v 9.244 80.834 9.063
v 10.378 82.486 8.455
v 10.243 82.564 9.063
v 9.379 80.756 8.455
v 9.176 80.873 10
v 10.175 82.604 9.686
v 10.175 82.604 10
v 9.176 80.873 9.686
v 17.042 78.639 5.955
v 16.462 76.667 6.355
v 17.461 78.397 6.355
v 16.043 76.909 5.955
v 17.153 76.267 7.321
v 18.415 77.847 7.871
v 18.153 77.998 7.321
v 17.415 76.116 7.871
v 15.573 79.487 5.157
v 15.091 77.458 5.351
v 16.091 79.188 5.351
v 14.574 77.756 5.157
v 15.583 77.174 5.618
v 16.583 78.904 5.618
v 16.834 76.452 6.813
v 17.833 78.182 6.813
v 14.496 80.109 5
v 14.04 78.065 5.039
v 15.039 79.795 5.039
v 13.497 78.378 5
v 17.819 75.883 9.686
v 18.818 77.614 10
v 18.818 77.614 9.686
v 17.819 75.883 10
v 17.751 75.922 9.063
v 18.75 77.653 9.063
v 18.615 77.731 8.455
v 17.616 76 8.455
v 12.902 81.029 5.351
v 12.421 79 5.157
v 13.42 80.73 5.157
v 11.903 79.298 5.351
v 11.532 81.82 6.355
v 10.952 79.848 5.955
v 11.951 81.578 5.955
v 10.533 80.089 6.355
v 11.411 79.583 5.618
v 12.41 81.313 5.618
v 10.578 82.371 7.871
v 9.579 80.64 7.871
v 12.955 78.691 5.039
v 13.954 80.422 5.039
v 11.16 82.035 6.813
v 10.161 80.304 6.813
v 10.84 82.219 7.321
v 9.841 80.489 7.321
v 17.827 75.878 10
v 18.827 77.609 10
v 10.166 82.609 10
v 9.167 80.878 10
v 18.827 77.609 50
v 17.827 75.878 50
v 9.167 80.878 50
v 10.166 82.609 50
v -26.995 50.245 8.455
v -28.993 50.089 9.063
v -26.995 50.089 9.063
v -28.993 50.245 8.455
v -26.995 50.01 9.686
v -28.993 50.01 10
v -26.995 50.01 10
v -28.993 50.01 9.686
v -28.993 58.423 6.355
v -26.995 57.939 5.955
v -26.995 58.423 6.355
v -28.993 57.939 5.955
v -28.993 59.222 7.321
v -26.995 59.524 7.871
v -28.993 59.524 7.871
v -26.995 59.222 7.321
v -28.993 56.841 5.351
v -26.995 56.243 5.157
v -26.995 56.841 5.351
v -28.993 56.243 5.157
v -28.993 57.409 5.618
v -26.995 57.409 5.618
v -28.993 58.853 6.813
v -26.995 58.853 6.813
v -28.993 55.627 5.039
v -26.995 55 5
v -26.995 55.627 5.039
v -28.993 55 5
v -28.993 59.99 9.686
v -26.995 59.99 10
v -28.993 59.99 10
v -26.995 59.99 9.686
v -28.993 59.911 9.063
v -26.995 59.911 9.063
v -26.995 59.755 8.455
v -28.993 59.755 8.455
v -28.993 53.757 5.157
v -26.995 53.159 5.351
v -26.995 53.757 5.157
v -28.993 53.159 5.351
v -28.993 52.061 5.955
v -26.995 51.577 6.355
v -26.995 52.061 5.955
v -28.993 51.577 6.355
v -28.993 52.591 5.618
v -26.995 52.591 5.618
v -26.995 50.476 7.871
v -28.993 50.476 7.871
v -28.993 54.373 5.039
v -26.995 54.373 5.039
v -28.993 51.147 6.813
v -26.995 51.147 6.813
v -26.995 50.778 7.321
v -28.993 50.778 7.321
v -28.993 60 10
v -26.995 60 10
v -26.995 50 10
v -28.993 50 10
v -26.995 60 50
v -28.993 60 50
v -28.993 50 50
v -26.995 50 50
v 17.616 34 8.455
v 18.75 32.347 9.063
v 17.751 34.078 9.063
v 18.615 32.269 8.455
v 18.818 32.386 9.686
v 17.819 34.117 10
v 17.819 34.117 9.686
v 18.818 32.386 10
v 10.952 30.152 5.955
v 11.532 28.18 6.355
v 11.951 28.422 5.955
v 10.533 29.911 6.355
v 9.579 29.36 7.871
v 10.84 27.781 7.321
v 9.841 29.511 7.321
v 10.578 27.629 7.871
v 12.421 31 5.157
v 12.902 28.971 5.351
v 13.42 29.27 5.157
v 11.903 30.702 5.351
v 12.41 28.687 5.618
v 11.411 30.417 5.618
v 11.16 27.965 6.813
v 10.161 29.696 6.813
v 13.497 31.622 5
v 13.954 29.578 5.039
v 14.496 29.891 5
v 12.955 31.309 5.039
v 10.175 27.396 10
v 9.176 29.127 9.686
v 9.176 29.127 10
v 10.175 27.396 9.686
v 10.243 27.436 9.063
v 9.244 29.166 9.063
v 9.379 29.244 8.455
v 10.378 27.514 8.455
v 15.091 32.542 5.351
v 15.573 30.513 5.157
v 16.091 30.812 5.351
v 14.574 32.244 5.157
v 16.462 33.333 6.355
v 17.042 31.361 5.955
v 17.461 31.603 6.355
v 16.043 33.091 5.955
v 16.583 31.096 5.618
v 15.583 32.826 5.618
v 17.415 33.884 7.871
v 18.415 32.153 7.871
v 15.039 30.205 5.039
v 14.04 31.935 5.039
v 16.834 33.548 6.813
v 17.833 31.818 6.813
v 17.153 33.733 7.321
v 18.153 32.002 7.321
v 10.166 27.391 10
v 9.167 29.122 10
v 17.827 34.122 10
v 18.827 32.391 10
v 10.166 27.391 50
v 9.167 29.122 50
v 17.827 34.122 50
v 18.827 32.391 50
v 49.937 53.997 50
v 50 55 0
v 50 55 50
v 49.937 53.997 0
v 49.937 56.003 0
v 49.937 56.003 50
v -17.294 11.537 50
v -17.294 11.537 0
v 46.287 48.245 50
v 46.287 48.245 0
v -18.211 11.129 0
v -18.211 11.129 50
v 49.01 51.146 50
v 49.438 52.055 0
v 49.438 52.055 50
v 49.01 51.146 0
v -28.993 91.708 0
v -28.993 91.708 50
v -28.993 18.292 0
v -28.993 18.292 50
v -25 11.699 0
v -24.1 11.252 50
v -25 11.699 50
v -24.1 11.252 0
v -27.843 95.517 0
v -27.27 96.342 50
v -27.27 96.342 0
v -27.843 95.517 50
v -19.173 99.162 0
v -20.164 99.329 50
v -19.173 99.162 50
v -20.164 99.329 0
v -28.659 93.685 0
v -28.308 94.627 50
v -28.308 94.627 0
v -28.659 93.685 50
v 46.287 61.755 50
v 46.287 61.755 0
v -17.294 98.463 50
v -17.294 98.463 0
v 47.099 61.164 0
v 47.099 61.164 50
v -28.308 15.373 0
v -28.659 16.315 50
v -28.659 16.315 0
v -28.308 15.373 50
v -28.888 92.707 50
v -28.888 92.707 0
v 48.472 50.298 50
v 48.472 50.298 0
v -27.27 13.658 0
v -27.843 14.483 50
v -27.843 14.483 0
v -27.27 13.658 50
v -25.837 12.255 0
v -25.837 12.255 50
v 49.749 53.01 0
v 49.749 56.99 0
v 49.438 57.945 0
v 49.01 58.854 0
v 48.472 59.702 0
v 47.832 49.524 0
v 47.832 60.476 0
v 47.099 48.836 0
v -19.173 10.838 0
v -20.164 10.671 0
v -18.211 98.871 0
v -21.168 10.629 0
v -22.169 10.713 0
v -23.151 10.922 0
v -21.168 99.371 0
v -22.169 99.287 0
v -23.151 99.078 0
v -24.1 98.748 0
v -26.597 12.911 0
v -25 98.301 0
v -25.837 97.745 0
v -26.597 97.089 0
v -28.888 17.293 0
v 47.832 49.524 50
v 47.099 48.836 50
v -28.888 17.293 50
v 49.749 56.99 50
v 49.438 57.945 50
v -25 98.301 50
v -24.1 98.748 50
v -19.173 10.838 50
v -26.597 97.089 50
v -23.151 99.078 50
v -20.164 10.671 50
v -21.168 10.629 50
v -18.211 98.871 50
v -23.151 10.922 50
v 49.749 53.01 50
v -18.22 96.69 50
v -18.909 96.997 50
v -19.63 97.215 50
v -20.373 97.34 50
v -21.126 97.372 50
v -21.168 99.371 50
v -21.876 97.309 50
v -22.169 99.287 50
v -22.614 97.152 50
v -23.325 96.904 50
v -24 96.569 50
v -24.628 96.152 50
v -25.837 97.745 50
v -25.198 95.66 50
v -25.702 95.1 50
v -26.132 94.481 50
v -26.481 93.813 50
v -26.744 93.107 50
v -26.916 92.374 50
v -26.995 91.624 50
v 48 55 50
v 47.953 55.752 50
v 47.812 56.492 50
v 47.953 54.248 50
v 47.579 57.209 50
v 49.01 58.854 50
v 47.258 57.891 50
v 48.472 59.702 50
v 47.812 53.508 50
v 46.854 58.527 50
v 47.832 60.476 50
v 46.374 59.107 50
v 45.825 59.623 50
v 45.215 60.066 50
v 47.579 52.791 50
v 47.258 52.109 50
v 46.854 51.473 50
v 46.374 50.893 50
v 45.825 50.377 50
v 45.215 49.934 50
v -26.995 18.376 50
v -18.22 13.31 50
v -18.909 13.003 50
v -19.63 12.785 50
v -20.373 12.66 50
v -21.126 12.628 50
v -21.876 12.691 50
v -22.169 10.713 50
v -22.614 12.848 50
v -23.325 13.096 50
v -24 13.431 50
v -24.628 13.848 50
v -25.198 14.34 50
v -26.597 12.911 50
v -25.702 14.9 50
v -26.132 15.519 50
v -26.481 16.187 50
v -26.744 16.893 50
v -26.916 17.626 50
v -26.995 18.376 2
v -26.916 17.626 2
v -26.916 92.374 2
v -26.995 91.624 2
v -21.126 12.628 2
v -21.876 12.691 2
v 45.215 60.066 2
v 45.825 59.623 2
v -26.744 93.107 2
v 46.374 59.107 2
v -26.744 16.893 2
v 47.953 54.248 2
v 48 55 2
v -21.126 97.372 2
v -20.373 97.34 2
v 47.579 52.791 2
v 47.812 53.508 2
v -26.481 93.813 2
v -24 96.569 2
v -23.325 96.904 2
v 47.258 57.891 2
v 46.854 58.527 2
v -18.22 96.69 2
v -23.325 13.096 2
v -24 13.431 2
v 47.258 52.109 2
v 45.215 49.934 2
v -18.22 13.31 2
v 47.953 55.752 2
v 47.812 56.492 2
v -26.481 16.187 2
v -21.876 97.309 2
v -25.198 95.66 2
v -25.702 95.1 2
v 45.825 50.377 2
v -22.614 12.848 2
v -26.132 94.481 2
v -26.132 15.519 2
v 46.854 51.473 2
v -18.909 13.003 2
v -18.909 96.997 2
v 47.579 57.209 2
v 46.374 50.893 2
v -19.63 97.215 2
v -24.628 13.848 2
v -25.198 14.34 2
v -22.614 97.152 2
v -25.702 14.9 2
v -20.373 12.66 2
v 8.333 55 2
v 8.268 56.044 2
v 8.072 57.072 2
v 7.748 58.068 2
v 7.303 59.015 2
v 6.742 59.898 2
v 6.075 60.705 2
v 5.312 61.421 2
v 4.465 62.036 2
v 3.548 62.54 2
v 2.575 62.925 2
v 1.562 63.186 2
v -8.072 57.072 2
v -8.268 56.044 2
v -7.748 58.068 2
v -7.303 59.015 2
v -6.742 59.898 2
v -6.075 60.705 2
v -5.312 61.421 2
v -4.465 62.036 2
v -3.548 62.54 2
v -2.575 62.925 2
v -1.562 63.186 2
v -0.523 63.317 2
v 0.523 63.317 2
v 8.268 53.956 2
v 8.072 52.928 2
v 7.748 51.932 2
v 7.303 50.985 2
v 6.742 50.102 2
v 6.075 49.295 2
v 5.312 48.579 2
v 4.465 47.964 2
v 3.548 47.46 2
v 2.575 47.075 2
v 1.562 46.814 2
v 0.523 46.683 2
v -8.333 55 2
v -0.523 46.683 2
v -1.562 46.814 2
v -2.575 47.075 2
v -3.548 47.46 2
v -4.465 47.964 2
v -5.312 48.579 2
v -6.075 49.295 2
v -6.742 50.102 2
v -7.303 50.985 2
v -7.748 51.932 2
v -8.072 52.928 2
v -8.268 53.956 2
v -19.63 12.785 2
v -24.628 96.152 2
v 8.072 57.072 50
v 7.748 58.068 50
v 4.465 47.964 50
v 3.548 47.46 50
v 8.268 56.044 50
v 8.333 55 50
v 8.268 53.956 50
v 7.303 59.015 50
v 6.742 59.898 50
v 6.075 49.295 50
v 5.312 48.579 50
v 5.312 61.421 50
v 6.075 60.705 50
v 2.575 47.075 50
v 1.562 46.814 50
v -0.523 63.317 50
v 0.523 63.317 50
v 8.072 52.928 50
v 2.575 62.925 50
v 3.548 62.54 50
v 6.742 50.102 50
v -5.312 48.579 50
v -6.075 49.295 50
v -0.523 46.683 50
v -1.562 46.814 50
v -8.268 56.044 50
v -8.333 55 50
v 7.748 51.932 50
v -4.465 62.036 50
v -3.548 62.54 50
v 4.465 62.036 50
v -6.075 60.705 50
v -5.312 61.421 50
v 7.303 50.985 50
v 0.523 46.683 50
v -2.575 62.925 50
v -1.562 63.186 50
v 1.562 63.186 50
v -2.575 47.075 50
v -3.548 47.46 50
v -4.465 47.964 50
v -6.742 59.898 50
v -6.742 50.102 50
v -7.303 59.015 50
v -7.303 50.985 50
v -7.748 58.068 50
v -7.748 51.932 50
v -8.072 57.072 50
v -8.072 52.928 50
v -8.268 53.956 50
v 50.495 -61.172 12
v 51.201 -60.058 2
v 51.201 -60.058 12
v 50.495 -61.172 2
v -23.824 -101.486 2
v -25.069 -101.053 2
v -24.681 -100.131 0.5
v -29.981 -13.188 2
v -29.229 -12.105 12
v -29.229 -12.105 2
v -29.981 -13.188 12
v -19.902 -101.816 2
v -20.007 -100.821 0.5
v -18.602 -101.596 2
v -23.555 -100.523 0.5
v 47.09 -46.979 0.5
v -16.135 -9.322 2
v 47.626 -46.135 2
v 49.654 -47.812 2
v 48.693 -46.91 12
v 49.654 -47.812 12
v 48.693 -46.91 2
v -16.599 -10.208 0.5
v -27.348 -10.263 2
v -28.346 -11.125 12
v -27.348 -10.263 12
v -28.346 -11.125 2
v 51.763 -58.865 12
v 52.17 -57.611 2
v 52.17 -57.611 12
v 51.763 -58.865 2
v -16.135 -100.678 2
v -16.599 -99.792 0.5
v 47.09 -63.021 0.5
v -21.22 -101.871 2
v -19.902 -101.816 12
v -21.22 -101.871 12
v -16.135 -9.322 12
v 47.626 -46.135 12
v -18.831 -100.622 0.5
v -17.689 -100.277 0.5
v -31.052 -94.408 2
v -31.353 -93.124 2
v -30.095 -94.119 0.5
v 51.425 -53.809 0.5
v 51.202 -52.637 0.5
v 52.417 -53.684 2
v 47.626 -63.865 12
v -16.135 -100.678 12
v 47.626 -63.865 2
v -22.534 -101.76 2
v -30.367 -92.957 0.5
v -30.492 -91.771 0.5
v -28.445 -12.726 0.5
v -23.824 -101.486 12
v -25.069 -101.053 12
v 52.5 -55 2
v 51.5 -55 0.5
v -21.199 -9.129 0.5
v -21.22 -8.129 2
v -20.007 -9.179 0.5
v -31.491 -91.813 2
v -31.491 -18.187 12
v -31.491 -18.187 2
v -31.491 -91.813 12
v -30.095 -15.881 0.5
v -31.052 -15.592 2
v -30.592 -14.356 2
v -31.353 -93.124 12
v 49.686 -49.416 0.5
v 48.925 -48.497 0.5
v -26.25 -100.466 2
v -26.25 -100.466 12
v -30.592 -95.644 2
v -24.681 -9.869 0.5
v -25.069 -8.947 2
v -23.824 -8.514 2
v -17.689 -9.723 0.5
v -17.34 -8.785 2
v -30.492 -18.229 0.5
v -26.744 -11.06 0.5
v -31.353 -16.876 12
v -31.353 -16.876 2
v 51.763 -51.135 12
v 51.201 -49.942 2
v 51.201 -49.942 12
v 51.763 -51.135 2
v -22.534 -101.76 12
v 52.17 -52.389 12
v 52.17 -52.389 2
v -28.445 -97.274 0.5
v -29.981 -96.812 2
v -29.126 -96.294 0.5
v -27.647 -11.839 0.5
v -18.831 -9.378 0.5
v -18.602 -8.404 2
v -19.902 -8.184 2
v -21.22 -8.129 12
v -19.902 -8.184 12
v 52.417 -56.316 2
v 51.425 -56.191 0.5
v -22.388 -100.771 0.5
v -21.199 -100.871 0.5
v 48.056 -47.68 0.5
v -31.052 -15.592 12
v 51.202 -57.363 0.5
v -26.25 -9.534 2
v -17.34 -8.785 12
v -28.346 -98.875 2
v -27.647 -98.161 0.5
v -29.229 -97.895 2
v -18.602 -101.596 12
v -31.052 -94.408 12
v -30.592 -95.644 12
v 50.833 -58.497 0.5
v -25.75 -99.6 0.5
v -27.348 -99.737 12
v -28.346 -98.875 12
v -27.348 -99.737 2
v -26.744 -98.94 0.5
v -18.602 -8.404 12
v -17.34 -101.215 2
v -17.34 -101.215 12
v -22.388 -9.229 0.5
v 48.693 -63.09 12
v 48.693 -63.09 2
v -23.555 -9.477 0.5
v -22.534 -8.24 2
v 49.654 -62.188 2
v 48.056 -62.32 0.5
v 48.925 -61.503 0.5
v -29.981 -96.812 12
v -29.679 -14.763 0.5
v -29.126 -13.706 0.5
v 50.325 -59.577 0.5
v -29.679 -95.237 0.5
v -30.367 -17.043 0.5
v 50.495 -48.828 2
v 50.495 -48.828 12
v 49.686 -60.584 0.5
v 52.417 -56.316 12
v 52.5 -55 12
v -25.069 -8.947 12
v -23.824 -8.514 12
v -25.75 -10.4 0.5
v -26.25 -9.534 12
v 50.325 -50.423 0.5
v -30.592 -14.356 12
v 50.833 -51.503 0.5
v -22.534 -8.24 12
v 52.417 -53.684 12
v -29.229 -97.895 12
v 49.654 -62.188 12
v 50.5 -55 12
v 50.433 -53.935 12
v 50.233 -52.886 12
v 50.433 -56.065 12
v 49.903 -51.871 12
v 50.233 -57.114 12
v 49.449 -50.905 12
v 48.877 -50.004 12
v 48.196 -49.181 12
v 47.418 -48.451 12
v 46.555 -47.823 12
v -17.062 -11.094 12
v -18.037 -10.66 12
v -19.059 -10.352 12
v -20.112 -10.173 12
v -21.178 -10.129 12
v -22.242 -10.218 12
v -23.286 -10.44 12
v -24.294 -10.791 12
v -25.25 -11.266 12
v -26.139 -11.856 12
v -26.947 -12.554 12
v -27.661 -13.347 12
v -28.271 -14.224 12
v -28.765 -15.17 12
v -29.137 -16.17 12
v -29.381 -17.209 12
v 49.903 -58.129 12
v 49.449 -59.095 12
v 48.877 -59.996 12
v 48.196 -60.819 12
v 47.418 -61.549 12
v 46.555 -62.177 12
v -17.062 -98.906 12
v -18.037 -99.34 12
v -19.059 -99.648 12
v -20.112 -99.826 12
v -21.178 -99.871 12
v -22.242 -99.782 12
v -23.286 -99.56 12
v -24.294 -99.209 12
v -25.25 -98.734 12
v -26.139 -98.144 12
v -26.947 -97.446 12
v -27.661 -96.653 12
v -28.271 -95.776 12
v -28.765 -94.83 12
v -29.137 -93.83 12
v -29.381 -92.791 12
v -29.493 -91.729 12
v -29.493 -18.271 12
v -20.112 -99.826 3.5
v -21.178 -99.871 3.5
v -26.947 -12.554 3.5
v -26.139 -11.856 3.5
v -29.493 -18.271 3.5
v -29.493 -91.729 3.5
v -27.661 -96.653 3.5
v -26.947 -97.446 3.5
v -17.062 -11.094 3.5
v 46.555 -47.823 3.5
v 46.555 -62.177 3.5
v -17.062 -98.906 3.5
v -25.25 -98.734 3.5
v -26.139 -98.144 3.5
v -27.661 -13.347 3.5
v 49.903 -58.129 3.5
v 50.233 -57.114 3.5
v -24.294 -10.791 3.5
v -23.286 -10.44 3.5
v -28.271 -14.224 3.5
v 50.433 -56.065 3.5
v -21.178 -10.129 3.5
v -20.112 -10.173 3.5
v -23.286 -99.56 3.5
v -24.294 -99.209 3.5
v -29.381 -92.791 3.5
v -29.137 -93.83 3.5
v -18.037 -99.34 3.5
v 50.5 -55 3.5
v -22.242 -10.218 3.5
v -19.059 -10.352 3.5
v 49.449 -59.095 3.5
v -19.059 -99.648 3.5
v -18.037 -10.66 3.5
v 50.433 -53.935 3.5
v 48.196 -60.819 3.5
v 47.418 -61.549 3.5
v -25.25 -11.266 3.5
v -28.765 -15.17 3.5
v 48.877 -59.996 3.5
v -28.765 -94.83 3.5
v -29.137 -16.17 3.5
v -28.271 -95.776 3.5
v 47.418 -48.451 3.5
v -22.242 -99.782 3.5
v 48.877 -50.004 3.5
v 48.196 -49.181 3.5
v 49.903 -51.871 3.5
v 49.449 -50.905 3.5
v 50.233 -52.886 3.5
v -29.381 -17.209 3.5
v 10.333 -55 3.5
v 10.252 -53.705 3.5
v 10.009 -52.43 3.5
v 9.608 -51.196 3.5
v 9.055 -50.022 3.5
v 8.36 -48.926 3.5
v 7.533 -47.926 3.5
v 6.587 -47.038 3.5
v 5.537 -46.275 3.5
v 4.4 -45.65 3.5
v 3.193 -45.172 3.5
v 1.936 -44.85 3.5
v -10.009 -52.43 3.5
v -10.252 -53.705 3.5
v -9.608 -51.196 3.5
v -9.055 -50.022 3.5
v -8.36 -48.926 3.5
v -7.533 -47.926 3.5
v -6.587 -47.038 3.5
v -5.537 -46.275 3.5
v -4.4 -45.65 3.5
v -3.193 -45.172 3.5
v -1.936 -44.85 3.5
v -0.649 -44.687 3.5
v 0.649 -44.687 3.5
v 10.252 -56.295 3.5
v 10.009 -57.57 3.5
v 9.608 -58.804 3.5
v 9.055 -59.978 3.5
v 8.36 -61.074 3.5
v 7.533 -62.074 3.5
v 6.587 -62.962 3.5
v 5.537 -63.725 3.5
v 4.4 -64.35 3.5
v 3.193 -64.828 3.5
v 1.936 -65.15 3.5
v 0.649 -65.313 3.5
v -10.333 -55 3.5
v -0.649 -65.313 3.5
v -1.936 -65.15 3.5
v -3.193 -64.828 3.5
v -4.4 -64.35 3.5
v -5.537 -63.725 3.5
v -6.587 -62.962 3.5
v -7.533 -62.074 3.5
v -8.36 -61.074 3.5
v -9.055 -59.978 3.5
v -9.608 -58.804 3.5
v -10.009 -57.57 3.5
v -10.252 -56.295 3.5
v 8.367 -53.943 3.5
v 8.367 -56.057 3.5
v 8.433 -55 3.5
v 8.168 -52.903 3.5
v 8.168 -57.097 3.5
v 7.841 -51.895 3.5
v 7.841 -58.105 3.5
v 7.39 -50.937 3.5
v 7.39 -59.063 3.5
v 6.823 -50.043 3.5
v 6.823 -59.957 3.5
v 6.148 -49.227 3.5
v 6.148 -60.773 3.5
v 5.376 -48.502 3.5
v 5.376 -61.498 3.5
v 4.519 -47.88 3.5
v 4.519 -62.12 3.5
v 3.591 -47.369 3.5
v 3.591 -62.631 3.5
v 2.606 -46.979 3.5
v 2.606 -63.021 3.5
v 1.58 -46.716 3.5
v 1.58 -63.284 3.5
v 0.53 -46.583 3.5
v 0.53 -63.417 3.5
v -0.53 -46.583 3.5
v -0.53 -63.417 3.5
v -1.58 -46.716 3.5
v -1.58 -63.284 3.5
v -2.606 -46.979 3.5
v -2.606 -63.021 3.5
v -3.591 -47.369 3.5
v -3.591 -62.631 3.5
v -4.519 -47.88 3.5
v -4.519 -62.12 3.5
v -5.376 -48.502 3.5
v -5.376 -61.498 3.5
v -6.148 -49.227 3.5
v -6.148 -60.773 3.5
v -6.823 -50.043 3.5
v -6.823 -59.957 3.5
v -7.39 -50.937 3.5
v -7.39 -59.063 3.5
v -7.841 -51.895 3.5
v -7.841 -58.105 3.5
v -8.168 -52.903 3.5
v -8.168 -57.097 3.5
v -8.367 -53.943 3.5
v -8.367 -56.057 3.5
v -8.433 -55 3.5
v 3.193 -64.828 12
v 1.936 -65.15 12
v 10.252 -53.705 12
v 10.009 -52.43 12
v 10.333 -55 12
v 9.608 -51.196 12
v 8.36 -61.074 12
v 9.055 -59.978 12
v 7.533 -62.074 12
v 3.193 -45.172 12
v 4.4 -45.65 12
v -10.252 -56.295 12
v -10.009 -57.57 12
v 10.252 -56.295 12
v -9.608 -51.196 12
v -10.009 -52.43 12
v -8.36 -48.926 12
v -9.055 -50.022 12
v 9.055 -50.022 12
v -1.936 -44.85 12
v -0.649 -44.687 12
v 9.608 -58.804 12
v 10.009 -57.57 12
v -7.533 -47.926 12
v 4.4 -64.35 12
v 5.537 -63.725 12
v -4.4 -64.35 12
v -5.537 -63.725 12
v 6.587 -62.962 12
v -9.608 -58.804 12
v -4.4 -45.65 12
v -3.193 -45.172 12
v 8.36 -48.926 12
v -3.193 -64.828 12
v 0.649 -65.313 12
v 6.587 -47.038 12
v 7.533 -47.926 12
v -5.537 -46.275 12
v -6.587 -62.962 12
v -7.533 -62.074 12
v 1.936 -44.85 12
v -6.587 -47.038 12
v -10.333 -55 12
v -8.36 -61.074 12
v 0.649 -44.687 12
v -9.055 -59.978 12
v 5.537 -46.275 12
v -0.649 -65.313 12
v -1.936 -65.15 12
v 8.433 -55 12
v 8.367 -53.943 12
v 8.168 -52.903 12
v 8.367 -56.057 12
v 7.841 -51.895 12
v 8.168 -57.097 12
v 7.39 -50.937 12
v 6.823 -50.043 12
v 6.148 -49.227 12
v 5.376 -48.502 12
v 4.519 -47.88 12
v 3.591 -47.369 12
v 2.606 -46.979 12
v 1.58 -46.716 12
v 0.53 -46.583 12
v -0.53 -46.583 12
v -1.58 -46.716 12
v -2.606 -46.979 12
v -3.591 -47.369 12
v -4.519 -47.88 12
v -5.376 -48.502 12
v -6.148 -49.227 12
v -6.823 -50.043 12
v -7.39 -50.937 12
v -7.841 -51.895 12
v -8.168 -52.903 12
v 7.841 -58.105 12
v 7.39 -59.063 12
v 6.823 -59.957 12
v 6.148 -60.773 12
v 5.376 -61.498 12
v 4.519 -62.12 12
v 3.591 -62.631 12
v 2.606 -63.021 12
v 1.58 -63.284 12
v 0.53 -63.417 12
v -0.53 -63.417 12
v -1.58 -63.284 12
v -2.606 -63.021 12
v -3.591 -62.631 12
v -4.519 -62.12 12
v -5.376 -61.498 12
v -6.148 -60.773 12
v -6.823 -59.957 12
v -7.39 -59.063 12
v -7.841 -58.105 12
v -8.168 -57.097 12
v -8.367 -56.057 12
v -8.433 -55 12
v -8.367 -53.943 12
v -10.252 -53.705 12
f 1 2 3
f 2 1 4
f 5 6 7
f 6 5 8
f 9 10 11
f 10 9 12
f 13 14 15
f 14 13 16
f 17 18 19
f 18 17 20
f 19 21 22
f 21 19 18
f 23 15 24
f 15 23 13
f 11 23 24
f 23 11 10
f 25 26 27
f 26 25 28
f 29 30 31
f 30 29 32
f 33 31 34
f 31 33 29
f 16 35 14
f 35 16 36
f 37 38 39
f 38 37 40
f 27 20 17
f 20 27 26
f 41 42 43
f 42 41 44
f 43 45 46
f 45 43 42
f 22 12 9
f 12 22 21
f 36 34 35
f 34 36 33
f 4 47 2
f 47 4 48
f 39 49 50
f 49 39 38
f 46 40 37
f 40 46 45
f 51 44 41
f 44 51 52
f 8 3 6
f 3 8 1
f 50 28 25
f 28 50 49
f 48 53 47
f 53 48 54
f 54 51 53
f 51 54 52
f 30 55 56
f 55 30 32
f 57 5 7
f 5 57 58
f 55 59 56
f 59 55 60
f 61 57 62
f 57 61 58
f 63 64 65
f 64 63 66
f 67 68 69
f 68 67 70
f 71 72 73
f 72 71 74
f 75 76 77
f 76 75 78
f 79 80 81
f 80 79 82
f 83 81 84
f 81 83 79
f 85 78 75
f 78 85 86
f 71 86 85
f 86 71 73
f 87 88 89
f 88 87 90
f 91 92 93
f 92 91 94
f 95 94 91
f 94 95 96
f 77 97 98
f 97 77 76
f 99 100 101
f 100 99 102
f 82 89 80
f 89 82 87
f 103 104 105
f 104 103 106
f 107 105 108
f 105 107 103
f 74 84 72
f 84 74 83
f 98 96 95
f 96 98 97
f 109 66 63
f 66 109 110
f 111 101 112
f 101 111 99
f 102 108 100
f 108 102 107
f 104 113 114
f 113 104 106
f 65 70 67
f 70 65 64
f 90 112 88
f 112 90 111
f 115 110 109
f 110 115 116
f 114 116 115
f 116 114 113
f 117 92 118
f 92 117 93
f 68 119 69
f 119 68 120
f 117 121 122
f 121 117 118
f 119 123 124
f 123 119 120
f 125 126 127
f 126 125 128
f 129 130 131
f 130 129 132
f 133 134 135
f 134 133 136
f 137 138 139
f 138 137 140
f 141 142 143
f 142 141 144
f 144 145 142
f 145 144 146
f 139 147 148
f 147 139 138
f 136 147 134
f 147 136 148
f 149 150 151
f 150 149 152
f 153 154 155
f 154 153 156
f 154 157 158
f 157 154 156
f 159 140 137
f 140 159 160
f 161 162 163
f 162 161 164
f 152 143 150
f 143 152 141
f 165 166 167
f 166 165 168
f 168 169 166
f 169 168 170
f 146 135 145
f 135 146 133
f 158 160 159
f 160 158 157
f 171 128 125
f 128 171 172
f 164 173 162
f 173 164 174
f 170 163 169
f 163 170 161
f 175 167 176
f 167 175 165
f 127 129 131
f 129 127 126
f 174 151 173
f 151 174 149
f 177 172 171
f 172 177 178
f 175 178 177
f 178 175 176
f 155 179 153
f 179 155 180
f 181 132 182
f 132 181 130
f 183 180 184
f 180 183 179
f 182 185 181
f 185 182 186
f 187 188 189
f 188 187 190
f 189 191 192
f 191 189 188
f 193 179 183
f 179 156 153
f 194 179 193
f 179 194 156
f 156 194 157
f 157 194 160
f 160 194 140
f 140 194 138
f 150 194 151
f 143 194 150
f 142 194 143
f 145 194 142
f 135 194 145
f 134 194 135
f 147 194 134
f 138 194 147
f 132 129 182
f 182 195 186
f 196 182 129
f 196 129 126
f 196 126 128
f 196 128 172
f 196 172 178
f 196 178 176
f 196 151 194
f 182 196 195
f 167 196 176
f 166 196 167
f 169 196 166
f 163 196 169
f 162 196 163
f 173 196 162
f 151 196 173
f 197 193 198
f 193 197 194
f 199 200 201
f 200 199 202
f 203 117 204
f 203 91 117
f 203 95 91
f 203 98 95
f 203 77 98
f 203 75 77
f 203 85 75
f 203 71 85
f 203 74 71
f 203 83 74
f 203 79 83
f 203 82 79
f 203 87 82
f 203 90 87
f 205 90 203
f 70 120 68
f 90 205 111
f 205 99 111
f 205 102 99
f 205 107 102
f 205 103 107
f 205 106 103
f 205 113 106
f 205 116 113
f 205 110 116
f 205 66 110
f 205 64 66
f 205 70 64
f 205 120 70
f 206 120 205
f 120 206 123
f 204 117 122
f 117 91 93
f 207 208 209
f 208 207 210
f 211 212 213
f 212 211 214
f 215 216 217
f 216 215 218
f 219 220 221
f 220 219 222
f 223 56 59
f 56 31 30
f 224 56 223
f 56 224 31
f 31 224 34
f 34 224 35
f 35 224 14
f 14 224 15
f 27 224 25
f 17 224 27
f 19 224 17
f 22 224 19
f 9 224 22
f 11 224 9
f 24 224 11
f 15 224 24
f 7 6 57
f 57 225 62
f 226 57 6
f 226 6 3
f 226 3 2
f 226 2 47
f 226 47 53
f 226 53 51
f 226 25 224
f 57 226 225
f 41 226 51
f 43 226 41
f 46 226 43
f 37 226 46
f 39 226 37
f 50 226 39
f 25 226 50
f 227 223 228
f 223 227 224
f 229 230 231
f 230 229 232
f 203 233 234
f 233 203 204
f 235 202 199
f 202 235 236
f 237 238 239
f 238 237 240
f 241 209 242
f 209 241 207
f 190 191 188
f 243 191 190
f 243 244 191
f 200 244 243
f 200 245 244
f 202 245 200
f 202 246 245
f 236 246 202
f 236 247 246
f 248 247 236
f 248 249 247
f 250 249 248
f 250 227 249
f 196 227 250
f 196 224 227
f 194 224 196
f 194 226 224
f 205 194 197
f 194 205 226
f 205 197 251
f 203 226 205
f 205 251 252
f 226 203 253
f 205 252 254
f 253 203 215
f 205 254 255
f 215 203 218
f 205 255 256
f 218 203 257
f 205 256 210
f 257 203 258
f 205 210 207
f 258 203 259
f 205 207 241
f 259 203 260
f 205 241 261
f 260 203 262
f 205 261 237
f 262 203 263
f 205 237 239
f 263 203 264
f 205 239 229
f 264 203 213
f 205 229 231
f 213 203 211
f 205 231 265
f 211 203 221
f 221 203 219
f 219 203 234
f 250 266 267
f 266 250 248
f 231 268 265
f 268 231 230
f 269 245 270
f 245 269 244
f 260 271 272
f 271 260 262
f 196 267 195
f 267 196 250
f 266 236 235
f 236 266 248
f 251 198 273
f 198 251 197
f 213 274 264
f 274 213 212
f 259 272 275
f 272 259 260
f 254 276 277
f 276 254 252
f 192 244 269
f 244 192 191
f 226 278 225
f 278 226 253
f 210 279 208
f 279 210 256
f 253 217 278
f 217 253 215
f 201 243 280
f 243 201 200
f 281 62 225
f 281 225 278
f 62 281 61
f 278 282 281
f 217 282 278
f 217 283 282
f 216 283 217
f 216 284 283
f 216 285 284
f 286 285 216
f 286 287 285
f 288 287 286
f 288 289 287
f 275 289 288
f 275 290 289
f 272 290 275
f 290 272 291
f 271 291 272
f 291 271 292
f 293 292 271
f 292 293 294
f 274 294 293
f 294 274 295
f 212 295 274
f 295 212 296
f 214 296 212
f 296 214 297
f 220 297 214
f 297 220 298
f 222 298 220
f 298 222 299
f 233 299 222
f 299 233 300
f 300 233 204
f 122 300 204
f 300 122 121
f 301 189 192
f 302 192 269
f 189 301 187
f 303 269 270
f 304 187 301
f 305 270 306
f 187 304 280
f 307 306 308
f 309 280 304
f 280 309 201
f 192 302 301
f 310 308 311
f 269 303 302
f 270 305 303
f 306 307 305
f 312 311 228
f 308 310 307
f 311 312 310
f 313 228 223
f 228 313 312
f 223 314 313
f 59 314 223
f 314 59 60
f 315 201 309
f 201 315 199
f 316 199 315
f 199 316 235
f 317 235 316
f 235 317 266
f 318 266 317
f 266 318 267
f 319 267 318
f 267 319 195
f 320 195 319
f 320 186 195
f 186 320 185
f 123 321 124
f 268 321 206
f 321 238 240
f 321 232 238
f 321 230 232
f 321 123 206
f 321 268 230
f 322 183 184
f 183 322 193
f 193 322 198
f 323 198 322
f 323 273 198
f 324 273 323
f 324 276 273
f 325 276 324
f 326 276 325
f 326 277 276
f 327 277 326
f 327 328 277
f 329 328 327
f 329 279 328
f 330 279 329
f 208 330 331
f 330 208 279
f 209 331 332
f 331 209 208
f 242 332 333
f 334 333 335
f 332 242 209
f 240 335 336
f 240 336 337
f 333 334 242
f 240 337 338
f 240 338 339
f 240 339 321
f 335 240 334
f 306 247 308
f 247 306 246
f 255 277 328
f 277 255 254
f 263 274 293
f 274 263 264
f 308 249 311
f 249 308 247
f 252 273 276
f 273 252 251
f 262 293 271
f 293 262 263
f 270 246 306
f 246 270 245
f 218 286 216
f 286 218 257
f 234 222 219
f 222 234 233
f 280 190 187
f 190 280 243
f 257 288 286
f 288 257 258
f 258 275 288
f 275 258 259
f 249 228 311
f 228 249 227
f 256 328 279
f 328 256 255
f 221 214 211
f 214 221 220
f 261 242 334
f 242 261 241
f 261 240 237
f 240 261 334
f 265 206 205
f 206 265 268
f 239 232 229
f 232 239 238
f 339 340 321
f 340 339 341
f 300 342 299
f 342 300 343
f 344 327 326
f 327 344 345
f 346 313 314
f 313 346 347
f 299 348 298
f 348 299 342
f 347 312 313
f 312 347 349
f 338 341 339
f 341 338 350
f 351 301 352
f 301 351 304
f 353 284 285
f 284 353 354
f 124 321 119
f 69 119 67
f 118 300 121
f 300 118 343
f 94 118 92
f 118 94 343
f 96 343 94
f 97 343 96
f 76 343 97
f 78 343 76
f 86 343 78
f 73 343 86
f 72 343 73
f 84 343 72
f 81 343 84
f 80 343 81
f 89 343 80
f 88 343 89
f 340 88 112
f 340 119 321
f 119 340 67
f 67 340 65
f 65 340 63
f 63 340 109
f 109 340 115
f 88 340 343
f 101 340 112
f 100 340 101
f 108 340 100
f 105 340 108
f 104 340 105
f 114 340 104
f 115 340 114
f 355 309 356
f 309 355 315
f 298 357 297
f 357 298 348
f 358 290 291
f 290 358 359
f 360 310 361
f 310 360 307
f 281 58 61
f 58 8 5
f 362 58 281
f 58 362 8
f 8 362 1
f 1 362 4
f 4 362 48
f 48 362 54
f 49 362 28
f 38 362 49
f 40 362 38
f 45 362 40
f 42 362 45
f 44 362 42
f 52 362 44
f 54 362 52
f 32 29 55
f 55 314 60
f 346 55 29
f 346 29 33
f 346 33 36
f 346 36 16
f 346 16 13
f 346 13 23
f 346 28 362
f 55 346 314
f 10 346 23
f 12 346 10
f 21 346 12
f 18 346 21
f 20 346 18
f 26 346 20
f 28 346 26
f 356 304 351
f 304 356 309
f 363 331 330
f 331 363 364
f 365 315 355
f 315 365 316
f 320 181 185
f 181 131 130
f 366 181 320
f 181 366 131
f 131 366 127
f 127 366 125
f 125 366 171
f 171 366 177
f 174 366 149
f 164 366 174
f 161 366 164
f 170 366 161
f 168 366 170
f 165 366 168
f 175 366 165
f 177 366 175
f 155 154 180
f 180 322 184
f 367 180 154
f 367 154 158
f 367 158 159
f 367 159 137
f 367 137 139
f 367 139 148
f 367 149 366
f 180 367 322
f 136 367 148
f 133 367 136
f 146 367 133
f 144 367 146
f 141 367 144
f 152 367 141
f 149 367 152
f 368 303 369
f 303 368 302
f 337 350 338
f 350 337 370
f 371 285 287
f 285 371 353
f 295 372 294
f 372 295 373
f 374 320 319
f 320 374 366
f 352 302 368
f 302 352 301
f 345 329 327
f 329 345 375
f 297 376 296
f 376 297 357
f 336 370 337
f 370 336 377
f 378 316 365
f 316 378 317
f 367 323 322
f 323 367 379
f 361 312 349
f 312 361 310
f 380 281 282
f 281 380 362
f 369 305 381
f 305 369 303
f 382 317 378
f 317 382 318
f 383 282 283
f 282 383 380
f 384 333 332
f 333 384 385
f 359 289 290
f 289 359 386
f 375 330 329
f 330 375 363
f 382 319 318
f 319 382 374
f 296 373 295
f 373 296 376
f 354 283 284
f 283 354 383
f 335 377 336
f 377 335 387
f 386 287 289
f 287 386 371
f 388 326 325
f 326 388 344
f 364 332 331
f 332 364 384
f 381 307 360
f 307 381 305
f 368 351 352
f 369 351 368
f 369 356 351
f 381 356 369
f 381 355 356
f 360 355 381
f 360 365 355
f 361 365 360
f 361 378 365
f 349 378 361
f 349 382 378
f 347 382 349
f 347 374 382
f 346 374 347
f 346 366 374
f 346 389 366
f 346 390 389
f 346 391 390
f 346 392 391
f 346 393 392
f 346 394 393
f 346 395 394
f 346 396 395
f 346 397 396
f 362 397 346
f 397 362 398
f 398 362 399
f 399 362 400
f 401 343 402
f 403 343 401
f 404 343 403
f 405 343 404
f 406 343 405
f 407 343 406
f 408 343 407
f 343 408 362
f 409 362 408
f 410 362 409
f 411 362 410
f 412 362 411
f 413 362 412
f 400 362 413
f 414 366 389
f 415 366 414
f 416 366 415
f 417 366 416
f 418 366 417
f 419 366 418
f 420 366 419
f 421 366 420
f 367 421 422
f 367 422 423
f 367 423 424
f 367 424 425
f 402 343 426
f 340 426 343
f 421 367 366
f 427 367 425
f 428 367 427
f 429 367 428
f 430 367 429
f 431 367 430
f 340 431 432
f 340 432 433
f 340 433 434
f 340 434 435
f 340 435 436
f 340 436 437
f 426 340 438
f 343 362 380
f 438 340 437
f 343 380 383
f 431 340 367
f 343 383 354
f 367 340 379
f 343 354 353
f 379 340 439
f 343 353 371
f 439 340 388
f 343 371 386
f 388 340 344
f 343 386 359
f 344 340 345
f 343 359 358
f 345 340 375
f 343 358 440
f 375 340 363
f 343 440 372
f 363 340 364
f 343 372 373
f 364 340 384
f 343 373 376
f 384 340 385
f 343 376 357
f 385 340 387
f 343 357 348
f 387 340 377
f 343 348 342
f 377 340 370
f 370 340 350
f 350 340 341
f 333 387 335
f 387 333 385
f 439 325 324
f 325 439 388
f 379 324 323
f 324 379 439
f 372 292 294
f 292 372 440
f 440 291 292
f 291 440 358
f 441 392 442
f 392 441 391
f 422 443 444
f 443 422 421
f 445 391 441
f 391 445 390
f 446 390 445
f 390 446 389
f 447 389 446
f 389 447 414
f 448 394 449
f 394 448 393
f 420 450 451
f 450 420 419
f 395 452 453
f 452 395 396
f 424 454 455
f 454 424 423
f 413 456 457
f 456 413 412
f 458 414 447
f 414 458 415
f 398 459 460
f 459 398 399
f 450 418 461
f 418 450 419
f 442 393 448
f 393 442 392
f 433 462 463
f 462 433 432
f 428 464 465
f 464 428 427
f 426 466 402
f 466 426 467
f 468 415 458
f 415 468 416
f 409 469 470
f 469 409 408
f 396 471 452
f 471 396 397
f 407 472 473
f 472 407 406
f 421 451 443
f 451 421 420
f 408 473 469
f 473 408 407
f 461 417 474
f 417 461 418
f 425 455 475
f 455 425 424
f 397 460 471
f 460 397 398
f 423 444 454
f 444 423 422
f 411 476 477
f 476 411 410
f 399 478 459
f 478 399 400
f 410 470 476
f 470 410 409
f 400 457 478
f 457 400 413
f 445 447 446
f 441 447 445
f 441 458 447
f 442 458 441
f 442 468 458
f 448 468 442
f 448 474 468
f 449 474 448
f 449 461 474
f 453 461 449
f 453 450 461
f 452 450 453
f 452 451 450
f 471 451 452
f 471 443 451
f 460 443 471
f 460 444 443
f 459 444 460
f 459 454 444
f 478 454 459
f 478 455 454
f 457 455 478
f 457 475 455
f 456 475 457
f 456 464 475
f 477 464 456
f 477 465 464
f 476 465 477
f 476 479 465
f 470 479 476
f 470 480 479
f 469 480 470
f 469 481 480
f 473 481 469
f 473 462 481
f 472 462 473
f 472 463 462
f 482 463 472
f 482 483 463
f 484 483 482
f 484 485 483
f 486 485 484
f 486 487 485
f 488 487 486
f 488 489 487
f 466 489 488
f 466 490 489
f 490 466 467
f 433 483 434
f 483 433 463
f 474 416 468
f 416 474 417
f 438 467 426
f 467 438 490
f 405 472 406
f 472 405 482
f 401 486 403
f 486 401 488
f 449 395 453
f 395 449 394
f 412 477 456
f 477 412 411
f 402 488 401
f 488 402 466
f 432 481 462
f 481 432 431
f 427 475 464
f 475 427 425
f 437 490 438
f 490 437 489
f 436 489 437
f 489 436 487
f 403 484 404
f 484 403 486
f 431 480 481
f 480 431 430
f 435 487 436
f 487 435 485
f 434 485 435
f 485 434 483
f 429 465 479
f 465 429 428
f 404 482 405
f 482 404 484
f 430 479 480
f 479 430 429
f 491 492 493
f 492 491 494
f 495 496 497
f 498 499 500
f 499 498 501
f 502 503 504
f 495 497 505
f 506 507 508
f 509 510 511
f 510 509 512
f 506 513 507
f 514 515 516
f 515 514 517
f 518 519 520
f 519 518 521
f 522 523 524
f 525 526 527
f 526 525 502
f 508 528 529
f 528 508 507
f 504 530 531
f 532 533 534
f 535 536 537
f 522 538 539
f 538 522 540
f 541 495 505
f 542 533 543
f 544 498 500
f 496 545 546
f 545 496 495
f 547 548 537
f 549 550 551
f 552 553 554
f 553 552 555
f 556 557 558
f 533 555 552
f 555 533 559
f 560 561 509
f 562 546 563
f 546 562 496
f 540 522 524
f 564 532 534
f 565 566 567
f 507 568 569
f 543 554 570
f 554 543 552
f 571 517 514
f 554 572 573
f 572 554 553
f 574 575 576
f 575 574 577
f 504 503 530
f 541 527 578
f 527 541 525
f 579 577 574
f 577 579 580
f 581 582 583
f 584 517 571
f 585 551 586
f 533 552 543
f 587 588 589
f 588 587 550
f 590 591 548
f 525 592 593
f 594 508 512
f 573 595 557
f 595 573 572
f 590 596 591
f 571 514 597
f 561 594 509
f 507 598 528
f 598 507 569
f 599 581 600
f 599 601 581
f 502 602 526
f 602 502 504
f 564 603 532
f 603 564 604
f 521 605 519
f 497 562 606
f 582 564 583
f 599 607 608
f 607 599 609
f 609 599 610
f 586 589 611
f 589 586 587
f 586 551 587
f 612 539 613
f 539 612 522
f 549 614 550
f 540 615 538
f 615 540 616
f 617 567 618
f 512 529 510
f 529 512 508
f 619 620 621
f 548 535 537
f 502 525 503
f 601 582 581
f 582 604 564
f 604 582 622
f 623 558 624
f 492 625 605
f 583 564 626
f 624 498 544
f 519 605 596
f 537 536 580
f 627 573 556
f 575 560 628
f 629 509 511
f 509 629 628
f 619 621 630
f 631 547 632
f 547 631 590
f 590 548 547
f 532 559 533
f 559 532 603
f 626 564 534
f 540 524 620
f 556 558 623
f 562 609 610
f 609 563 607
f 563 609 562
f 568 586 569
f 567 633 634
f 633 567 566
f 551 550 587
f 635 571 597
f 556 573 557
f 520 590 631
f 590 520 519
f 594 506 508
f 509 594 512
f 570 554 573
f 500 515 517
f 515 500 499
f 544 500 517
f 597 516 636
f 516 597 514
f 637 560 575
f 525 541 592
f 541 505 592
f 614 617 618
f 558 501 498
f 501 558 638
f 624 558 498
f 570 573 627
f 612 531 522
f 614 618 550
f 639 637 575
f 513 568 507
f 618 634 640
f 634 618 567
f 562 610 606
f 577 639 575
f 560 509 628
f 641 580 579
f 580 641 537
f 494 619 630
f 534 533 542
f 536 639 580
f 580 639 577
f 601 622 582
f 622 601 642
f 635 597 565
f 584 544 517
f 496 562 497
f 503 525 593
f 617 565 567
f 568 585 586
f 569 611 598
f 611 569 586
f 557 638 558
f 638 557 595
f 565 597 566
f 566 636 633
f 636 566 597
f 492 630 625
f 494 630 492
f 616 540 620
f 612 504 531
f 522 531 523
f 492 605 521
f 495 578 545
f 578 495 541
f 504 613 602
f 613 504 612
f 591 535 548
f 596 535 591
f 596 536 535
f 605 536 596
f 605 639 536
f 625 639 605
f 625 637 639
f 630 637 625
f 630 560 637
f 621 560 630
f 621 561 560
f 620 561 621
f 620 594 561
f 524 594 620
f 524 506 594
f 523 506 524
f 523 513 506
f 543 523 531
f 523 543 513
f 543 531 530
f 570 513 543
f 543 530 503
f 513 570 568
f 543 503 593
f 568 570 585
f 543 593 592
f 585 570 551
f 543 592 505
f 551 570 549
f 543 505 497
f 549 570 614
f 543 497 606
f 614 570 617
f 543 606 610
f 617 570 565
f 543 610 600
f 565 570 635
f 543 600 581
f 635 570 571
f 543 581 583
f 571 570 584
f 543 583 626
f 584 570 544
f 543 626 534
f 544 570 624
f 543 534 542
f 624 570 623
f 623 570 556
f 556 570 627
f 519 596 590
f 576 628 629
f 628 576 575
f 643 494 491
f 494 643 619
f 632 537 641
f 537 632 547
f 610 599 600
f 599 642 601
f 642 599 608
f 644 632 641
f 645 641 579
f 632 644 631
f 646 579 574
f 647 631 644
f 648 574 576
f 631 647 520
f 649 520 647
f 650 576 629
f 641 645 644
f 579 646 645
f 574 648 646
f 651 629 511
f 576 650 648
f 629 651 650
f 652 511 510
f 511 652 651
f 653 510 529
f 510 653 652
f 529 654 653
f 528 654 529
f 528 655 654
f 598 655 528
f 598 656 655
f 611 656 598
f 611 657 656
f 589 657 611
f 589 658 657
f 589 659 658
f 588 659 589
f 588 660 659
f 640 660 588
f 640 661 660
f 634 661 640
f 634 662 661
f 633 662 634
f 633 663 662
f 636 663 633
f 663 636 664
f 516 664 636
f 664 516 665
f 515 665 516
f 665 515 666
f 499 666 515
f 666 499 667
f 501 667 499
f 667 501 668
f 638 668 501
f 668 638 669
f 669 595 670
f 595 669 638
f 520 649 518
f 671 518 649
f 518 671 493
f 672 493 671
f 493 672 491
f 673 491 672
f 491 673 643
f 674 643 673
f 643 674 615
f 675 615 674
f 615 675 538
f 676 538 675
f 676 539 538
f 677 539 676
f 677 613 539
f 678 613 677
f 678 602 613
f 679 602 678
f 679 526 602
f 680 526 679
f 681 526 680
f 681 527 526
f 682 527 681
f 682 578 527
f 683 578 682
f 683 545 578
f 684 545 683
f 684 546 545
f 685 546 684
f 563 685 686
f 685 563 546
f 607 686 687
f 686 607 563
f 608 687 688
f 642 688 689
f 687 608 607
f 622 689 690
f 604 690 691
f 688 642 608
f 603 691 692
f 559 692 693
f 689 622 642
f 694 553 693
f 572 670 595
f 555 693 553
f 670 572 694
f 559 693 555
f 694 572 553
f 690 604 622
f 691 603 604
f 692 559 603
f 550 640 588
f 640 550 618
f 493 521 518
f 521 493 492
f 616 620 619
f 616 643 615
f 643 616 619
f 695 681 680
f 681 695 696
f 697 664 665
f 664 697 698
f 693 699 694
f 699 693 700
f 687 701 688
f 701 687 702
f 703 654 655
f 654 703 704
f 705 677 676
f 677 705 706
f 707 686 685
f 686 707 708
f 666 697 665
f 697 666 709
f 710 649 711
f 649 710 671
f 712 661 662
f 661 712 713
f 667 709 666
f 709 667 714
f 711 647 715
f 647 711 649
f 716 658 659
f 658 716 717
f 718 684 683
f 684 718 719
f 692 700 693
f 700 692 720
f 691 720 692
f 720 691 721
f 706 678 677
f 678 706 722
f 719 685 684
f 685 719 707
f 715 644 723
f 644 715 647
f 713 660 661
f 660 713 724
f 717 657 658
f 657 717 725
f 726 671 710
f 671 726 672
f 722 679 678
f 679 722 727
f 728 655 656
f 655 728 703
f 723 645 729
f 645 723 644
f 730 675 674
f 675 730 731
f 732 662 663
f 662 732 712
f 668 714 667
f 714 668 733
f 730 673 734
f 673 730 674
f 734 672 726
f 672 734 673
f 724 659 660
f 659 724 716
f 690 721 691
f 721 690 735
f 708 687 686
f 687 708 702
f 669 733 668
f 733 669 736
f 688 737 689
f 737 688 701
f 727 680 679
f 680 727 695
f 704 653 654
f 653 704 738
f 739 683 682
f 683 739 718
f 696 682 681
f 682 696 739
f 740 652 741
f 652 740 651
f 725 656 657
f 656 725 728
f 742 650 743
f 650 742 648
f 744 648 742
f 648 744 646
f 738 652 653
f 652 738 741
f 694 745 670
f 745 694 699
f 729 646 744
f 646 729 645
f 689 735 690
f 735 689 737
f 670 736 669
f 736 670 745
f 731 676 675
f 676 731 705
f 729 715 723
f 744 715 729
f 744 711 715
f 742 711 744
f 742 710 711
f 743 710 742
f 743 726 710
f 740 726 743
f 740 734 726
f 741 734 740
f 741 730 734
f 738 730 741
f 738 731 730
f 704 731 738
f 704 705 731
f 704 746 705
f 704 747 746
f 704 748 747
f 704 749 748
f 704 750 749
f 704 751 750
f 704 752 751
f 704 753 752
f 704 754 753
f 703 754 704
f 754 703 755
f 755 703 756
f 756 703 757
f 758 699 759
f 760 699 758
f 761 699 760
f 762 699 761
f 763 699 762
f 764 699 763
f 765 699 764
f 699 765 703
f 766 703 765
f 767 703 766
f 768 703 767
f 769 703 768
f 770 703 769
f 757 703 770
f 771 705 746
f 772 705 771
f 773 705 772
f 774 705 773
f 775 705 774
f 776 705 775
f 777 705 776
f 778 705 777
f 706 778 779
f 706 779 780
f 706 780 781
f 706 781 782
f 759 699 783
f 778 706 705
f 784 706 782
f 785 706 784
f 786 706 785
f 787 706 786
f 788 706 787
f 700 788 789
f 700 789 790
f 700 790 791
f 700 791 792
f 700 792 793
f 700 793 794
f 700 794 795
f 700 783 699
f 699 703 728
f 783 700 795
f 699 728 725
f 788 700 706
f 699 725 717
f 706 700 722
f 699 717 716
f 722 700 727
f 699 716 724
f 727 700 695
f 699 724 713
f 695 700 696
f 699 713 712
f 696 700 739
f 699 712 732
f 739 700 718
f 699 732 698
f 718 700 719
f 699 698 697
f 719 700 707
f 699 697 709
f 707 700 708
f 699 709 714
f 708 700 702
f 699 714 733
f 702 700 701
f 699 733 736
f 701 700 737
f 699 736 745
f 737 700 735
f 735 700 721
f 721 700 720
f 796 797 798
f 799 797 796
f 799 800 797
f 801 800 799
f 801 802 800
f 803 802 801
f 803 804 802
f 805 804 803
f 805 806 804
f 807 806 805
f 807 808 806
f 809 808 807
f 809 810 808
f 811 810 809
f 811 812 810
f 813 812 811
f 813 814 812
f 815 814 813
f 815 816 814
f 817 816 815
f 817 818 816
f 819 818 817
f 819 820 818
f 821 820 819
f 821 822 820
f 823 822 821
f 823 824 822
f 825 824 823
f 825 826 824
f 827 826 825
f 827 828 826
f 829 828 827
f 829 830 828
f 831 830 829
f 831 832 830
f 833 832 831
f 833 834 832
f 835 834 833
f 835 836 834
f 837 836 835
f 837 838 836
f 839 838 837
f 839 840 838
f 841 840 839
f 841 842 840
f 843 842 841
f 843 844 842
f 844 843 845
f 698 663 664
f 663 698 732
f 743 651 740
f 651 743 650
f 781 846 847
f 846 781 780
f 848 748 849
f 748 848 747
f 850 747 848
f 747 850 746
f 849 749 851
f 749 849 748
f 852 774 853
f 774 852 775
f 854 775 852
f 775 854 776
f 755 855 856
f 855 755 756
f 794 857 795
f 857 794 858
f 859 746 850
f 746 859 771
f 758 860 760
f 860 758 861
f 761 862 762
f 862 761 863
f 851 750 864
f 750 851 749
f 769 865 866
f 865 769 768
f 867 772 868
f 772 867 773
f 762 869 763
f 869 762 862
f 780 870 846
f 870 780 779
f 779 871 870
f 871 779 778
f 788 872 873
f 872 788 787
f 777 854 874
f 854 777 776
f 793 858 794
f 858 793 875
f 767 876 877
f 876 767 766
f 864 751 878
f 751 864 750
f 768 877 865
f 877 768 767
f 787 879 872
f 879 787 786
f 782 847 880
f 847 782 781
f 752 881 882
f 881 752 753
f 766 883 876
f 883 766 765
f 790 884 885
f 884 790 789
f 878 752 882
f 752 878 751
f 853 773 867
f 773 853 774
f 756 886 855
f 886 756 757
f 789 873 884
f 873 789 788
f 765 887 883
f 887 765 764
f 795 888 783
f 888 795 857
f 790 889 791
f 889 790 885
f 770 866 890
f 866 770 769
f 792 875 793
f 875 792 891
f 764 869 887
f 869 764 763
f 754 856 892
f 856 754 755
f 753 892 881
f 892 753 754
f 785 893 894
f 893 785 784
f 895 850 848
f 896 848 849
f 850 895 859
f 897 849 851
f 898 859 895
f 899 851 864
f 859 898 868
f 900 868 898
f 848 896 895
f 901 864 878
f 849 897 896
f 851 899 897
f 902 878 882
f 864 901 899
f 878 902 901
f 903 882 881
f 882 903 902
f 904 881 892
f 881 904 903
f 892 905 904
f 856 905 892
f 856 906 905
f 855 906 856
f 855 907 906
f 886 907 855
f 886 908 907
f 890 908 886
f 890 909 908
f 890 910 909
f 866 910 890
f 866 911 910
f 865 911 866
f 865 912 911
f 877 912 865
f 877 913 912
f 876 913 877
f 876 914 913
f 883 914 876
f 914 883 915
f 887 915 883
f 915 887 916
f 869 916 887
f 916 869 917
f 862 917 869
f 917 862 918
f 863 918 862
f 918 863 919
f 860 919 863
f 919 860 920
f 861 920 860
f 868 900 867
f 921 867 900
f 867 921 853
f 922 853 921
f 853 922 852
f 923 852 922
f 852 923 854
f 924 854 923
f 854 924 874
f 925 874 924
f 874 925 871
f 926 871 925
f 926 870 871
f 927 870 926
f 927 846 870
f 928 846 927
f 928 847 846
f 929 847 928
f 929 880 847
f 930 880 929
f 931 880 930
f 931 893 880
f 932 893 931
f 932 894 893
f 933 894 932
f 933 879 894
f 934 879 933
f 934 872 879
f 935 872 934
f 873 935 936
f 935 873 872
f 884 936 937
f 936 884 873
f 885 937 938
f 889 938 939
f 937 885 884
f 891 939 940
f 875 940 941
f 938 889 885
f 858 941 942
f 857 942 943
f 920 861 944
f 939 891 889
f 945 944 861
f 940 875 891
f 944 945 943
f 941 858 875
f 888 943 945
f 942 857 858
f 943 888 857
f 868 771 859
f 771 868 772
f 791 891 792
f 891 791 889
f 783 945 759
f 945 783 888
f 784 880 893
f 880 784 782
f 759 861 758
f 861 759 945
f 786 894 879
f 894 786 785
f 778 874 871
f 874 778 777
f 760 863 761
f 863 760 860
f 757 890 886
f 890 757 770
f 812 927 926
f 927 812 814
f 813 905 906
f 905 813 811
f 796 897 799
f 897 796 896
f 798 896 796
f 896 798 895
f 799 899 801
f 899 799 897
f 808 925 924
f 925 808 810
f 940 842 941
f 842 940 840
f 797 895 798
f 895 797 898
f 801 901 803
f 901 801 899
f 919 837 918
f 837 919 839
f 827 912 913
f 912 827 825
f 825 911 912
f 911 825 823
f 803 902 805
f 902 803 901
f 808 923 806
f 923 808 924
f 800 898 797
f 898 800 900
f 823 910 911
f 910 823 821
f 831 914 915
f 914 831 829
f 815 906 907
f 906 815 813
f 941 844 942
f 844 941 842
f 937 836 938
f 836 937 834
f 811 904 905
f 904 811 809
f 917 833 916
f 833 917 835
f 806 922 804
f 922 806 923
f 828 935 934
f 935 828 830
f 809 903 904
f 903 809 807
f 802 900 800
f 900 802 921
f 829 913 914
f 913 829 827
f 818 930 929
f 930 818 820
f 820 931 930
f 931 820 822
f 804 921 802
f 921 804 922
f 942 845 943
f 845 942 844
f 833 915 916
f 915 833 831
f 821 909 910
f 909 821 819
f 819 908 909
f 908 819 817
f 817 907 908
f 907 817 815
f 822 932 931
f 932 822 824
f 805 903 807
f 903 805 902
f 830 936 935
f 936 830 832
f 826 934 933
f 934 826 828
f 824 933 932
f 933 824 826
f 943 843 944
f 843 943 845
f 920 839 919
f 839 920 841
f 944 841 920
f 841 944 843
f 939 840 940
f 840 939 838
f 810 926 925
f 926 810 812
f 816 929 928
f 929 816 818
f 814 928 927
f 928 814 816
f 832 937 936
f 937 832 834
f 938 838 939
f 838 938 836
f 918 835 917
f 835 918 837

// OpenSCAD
// cable_management_polybox.scad
// Parametric Desktop Cable Organizer, Container, Enclosure, Storage
// Author: Tony Z. Tonchev, Michigan (USA) 
// last update: February 2019

// PolyBox Number of Sides
PolyBox_Sides = 3; //[3:3-SIDED, 4:4-SIDED, 5:5-SIDED, 6:6-SIDED, 7:7-SIDED, 8:8-SIDED]

// Polybox Diameter (in mm)
PolyBox_Diameter = 100;

// Polybox Depth (in mm)
PolyBox_Depth = 50;

// Box corner radius (in mm)
PolyBox_Corner_Radius = 8; //[4:50]

// Box Thickness
PolyBox_Thickness = 2; //[1:5]

// Cable Center Post
Center_Post = 1; //[1:YES, 0:NO]

// Group
Build_Group = 1; //[1:BOTH, 2:BOX, 3:LID]

/* [Hidden] */

TZT_S = PolyBox_Sides;
TZT_R = PolyBox_Diameter/2;
TZT_D = PolyBox_Depth;
TZT_C = PolyBox_Corner_Radius;
TZT_T = PolyBox_Thickness;
TZT_P = Center_Post;
$fn=50;


//TZT_Box ([sides, radius, depth, corner_radius])

if (Build_Group!=3) translate ([0,TZT_R*1.1,0]) TZT_Box ();
if (Build_Group!=2) translate ([0,-TZT_R*1.1,0]) TZT_Lid ();

module TZT_Lid () {
    translate ([0,0,7]) {
        difference () {
            hull () {
                TZT_Vol ([TZT_S,TZT_R+TZT_T+.5,10,TZT_C+TZT_T+.5]);
                translate ([0,0,-6]) TZT_Vol ([TZT_S,TZT_R+TZT_T-.5,1,TZT_C+TZT_T-.5]);
            }
            translate ([0,0,TZT_T]) TZT_Vol ([TZT_S,TZT_R+.5,11,TZT_C+.5]);
        }
        if (TZT_P==1) {
            difference () {
                cylinder (10,TZT_R/6+TZT_T,TZT_R/6+TZT_T,true);
                cylinder (11,TZT_R/6+0.1,TZT_R/6+0.1,true);
            }
        }
    }
}

module TZT_Box () {
    translate ([0,0,TZT_D/2]) {
        difference () {
            TZT_Vol ([TZT_S,TZT_R,TZT_D,TZT_C]);
            translate ([0,0,TZT_T]) TZT_Vol ([TZT_S,TZT_R-TZT_T,TZT_D,TZT_C-TZT_T]);
            TZT_Cslot ();
        }
        if (TZT_P==1) cylinder (TZT_D,TZT_R/6,TZT_R/6,true);
    }    
}

module TZT_Vol (TZT) {
    hull ()
        for (i=[0:360/TZT[0]:359])
        rotate ([0,0,i])
        translate ([TZT[1]-TZT[3], 0, 0]) 
        cylinder (TZT[2], TZT[3], TZT[3], true);
}

module TZT_Cslot () {
    for (i=[0:360/TZT_S:359]) {
        rotate ([180,-90,360/TZT_S/2+i])
            translate ([-TZT_D/2+10,0,TZT_R/2])
            union () {
                cylinder (TZT_R,5,5);
                translate ([0,-5,0]) cube ([TZT_D,10,TZT_R]);
            }
    }
}
